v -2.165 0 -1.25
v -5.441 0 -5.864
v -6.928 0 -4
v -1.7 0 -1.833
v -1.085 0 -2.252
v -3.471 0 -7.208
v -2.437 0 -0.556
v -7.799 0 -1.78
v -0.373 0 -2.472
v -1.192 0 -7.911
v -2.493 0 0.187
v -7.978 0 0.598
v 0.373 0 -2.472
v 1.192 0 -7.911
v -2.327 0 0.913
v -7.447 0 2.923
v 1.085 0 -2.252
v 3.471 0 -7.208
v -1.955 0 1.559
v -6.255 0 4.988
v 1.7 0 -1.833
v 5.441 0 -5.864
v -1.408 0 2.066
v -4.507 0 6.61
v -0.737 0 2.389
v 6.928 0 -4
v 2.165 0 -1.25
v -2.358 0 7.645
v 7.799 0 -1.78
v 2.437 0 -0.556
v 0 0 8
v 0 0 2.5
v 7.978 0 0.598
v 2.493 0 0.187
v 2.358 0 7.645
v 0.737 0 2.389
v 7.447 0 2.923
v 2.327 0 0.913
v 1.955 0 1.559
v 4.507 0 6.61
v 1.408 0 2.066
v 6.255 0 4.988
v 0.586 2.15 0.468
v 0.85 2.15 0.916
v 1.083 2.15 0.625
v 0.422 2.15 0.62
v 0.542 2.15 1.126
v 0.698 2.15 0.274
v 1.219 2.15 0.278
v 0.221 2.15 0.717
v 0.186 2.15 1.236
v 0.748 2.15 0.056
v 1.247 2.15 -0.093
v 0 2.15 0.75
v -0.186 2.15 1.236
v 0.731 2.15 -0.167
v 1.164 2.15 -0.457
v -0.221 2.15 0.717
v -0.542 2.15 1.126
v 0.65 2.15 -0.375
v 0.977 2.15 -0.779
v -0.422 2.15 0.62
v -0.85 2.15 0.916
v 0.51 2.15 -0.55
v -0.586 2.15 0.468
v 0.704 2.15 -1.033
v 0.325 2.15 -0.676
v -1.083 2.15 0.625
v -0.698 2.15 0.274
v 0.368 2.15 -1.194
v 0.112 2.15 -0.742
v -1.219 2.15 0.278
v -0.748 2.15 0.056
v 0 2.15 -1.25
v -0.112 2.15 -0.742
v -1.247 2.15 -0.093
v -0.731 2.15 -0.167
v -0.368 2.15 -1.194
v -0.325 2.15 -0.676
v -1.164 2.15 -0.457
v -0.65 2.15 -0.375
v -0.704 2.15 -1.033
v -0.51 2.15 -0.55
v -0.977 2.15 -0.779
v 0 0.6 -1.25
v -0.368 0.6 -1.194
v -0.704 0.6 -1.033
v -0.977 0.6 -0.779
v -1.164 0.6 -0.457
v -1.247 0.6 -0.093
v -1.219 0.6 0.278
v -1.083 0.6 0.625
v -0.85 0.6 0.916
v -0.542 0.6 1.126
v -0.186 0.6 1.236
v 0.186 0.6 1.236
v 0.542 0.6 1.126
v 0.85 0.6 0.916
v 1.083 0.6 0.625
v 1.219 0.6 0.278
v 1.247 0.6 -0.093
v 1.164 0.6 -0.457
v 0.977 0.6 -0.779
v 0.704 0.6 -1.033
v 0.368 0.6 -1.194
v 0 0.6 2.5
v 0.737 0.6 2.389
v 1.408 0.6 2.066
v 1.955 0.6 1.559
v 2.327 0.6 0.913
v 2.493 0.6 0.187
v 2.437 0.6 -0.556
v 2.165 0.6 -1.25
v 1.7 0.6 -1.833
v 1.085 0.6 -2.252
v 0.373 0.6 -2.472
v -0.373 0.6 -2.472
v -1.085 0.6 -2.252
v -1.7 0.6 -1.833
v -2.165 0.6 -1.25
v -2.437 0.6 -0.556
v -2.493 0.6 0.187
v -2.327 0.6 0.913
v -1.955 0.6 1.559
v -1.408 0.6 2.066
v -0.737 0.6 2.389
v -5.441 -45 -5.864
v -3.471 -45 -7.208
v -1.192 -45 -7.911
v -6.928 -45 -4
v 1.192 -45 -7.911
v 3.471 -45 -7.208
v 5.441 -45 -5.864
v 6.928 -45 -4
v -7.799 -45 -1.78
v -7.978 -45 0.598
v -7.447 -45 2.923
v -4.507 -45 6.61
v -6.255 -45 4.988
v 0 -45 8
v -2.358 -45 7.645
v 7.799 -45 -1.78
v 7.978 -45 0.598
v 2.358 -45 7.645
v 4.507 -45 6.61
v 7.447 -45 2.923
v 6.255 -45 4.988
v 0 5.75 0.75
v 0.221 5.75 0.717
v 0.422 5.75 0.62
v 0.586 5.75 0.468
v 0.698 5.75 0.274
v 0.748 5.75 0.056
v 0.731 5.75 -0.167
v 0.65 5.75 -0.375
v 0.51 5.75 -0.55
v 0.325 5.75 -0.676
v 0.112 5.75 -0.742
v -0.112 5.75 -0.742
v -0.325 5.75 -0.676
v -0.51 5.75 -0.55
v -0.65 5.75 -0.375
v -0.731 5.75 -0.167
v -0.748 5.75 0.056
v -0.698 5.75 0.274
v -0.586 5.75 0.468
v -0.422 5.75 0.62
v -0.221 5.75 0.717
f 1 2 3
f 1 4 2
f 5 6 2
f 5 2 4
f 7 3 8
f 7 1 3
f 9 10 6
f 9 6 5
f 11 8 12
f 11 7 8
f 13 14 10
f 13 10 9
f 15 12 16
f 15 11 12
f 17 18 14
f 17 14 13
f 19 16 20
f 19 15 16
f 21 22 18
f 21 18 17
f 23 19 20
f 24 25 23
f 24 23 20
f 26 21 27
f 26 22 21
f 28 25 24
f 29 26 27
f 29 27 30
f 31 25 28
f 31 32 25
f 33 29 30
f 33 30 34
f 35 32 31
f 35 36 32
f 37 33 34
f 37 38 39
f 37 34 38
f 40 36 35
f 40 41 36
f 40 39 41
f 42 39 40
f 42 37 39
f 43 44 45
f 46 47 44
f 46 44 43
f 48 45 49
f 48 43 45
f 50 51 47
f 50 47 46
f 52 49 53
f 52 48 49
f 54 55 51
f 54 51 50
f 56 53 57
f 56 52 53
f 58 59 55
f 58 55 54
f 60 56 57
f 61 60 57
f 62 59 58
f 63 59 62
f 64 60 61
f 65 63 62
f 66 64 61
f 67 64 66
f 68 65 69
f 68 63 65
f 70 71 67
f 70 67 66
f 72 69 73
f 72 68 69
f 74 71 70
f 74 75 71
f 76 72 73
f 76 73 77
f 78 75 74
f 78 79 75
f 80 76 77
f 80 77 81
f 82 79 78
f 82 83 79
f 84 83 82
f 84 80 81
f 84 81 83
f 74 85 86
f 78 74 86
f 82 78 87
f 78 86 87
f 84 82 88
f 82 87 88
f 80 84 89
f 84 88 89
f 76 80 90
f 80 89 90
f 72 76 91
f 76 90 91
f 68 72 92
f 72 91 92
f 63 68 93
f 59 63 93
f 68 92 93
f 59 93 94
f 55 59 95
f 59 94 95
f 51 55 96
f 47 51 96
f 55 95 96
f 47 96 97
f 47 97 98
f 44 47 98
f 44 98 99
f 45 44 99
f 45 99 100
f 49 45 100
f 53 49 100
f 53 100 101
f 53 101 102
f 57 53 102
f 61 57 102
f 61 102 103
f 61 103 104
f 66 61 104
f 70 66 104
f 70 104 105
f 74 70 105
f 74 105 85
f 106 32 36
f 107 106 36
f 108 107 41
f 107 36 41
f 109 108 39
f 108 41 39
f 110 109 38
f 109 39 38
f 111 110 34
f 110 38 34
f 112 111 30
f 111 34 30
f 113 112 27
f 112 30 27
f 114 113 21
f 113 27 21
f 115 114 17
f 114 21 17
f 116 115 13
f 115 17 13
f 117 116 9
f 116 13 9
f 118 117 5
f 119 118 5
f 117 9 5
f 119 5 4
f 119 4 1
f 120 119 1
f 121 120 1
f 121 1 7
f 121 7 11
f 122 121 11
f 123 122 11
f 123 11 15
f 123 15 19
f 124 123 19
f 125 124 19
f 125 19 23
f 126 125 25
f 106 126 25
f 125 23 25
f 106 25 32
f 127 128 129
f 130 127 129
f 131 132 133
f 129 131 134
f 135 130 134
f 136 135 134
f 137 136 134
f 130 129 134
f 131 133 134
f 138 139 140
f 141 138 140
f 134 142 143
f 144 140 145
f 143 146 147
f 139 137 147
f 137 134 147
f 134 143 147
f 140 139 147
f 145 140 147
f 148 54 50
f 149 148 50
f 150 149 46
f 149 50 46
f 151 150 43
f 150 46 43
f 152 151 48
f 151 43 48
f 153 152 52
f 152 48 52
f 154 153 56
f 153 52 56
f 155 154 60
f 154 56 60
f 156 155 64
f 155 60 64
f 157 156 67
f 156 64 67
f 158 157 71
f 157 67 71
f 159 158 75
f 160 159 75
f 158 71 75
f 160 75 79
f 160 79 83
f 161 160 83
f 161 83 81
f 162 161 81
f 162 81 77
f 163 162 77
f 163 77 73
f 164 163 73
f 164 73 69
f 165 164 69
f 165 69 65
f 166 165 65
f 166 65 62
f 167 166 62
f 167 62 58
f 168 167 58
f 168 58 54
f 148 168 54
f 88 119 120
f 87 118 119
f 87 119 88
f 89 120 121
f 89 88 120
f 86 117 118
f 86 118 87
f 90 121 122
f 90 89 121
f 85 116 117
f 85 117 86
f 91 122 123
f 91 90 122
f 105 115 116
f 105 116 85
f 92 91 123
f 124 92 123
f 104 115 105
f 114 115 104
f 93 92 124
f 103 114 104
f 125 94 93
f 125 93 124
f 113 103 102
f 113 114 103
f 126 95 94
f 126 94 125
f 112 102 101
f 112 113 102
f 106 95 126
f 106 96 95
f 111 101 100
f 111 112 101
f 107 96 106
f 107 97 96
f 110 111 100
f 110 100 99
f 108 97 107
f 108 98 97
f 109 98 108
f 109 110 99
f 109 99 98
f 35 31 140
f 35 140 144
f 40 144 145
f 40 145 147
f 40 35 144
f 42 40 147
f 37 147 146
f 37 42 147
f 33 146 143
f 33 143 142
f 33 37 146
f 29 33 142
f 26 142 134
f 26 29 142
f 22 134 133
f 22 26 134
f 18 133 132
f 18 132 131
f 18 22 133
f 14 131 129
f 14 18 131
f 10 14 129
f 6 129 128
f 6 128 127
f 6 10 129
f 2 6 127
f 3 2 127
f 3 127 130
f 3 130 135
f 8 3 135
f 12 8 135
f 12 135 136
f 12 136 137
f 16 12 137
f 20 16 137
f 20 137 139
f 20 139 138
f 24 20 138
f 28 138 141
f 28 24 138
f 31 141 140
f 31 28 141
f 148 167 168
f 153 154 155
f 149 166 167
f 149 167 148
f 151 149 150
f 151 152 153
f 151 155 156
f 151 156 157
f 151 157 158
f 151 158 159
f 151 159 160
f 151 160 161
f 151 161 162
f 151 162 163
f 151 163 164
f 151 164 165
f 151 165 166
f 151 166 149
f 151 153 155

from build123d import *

# Parameters (mm, degrees)
SKETCH1_R           = 8
BOSS_EXTRUDE1_DEPTH = 45
SKETCH2_R           = 2.5
BOSS_EXTRUDE2_DEPTH = 0.6
SKETCH3_R           = 0.75
BOSS_EXTRUDE3_DEPTH = 5.75
SKETCH5_R           = 1.25
BOSS_EXTRUDE4_DEPTH = 2.15


with BuildPart() as part:
    # Sketch1 → Boss-Extrude1 (new body)
    with BuildSketch(Plane(origin=(0, 0, 0), x_dir=(1, 0, 0), z_dir=(0, 1, 0))):
        with Locations(Location((0, 0, 0), (0, 0, 270))):
            Circle(SKETCH1_R)
    extrude(amount=-BOSS_EXTRUDE1_DEPTH)

    # Sketch2 → Boss-Extrude2 (add)
    with BuildSketch(Plane(origin=(0, 0, 0), x_dir=(1, 0, 0), z_dir=(0, 1, 0))):
        with Locations(Location((0, 0, 0), (0, 0, 270))):
            Circle(SKETCH2_R)
    extrude(amount=BOSS_EXTRUDE2_DEPTH)

    # Sketch3 → Boss-Extrude3 (add)
    with BuildSketch(Plane(origin=(0, 0, 0), x_dir=(1, 0, 0), z_dir=(0, 1, 0))):
        with Locations(Location((0, 0, 0), (0, 0, 270))):
            Circle(SKETCH3_R)
    extrude(amount=BOSS_EXTRUDE3_DEPTH)

    # Sketch5 → Boss-Extrude4 (add)
    with BuildSketch(Plane(origin=(0, 0, 0), x_dir=(1, 0, 0), z_dir=(0, 1, 0))):
        with Locations(Location((0, 0, 0), (0, 0, 90))):
            Circle(SKETCH5_R)
    extrude(amount=BOSS_EXTRUDE4_DEPTH)


solid = part.part
